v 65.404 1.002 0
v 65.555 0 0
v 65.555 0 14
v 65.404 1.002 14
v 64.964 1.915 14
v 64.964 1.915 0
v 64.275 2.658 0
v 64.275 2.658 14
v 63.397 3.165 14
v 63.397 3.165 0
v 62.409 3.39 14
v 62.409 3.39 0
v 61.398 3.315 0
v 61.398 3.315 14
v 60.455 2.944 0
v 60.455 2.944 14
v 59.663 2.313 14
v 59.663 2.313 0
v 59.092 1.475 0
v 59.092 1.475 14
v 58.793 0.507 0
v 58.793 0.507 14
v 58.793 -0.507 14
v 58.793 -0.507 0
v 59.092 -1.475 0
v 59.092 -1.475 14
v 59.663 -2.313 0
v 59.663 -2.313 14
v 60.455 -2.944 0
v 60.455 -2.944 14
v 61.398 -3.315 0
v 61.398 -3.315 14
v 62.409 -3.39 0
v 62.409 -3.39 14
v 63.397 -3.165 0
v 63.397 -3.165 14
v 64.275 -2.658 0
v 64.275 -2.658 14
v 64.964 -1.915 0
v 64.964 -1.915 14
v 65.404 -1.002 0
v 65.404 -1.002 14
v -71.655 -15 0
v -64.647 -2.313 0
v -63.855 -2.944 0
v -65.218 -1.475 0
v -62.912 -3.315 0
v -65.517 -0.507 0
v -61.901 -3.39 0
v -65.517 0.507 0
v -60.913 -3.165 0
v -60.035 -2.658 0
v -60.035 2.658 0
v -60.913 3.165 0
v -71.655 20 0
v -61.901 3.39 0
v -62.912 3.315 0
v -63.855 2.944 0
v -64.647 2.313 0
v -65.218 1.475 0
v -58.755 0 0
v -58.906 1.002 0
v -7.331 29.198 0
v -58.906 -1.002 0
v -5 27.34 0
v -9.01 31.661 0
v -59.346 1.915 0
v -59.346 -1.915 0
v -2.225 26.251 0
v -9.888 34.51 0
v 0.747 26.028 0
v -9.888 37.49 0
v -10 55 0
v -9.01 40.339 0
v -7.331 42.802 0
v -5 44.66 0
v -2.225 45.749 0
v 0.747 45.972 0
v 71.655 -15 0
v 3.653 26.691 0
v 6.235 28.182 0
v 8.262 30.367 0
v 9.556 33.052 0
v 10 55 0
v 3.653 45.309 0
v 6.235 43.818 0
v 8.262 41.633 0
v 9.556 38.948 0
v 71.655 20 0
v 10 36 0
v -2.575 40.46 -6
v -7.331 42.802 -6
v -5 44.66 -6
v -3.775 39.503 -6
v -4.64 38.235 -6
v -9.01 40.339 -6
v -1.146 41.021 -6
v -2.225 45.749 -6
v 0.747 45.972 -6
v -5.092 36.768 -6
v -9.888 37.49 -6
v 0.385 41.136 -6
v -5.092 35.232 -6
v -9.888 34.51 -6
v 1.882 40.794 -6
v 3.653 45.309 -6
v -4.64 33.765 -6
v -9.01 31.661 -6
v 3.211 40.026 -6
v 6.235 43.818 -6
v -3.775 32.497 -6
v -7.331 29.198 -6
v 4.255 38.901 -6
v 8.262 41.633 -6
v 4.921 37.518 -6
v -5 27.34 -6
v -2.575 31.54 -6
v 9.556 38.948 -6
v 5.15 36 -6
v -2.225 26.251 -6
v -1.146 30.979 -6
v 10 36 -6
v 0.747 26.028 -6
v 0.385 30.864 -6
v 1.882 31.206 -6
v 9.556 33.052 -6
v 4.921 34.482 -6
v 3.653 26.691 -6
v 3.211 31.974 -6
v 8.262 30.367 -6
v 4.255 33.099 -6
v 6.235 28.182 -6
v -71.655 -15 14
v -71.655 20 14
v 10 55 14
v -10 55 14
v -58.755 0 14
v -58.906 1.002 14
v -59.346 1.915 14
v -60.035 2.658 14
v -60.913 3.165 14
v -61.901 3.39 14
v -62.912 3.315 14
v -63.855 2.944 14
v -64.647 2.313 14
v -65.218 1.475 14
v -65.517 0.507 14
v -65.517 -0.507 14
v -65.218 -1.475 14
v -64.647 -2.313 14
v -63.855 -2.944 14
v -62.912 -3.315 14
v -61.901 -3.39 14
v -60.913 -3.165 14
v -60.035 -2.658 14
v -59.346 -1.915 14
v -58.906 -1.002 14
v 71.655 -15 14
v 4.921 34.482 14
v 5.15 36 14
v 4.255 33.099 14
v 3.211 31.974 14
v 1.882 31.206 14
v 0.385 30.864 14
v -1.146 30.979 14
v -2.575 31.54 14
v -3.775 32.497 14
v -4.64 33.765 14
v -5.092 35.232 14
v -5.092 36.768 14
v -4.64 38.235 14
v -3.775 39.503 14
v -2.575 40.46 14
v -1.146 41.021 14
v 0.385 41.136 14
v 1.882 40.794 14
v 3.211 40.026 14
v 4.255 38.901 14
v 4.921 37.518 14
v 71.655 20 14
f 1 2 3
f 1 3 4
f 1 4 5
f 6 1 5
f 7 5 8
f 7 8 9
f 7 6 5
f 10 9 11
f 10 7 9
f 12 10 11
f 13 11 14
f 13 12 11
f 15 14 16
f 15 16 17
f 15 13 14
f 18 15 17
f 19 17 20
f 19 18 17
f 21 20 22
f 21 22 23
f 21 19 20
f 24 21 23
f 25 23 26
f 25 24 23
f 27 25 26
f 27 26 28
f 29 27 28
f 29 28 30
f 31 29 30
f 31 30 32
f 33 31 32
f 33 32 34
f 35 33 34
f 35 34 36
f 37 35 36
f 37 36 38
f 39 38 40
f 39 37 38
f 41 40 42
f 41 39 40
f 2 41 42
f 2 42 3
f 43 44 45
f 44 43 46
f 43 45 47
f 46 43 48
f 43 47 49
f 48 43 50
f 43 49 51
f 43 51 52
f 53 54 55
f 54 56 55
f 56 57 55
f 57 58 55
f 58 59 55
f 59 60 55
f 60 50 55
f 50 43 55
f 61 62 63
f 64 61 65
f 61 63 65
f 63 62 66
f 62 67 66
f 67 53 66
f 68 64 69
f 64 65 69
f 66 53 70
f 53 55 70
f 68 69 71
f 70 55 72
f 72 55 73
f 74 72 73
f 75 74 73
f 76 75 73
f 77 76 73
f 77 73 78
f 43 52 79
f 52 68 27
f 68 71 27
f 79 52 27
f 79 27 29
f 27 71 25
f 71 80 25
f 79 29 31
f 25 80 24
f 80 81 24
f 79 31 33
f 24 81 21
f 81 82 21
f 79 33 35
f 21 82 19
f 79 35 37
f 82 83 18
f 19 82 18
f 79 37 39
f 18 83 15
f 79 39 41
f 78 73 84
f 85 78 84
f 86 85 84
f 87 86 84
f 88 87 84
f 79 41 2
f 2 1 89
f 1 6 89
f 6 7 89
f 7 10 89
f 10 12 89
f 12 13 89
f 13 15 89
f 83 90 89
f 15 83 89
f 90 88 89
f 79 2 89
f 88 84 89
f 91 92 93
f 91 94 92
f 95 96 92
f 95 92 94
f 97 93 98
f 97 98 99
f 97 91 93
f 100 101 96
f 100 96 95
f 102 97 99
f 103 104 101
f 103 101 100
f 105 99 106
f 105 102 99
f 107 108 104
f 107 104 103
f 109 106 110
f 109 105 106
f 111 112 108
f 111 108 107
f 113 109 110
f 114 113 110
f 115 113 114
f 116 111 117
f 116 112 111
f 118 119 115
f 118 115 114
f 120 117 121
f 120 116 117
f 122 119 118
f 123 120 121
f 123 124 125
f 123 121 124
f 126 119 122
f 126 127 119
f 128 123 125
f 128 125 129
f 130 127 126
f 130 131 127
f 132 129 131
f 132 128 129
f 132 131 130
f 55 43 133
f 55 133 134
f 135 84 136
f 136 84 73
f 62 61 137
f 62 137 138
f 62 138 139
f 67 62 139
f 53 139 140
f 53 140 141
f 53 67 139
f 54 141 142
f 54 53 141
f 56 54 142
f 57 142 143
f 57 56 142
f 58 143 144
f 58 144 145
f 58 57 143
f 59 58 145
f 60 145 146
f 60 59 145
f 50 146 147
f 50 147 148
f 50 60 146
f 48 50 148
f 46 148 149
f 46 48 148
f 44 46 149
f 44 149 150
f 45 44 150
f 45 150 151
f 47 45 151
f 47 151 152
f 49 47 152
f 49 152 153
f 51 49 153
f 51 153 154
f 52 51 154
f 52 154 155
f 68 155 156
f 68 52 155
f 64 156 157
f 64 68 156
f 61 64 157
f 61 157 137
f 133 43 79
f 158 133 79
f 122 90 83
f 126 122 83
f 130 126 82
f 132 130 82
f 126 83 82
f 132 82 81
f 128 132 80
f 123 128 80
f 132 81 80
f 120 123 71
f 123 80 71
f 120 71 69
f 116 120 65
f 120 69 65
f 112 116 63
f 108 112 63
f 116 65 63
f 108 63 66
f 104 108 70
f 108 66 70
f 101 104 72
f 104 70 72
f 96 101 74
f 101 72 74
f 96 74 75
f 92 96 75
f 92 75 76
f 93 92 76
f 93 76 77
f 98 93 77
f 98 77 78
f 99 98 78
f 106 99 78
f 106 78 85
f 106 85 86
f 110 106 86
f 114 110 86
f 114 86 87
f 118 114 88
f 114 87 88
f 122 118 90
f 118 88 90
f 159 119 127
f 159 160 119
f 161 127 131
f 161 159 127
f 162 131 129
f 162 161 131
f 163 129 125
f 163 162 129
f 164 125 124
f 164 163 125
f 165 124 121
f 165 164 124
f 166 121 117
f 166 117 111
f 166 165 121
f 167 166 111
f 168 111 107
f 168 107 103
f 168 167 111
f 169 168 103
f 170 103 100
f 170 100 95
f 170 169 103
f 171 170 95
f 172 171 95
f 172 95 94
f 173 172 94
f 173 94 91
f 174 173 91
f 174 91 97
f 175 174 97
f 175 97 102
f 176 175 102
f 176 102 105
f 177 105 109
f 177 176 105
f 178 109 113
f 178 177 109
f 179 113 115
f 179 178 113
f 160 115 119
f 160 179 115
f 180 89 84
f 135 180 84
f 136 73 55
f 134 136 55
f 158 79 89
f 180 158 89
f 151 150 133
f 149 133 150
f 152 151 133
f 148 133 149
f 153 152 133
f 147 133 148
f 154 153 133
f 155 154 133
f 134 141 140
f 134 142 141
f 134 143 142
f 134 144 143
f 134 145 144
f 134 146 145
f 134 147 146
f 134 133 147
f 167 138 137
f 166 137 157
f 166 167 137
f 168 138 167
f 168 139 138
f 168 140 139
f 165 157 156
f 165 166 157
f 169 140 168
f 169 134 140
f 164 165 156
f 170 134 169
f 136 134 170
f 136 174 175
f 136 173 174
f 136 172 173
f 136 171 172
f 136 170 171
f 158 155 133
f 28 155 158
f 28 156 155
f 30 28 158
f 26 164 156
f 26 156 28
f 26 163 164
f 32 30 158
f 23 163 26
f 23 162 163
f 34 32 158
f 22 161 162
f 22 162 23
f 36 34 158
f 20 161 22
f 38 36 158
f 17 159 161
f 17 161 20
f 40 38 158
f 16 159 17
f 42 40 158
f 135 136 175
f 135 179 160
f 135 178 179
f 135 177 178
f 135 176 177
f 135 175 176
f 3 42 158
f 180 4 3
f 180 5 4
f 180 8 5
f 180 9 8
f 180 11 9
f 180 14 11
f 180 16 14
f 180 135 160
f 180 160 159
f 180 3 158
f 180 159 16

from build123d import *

# Parameters (mm, degrees)
F0_W     = 143.31
F0_H     = 35
F0_R     = 3.4
F0_R_2   = 5.15
F1_DEPTH = 14
F2_R     = 10
F2_R_2   = 5.15
F3_DEPTH = 6


with BuildPart() as f1:
    # F0 (on Top) → F1 (new body)
    with BuildSketch(Plane.XY):
        with Locations((0, 2.5)):
            Rectangle(F0_W, F0_H)
        with Locations((-62.155, 0)):
            Circle(F0_R, mode=Mode.SUBTRACT)
        with Locations((62.155, 0)):
            Circle(F0_R, mode=Mode.SUBTRACT)
        Polygon((-10, 55), (-71.655, 20), (71.655, 20), (10, 55), align=None)
        with Locations((0, 36)):
            Circle(F0_R_2, mode=Mode.SUBTRACT)
    extrude(amount=F1_DEPTH)

    # F2 (on face) → F3 (join)
    with BuildSketch(Plane(origin=(0, 0, 0), x_dir=(1, 0, 0), z_dir=(0, 0, -1))):
        with Locations((0, -36)):
            Circle(F2_R)
        with Locations((0, -36)):
            Circle(F2_R_2, mode=Mode.SUBTRACT)
    extrude(amount=F3_DEPTH)


solid = f1.part
